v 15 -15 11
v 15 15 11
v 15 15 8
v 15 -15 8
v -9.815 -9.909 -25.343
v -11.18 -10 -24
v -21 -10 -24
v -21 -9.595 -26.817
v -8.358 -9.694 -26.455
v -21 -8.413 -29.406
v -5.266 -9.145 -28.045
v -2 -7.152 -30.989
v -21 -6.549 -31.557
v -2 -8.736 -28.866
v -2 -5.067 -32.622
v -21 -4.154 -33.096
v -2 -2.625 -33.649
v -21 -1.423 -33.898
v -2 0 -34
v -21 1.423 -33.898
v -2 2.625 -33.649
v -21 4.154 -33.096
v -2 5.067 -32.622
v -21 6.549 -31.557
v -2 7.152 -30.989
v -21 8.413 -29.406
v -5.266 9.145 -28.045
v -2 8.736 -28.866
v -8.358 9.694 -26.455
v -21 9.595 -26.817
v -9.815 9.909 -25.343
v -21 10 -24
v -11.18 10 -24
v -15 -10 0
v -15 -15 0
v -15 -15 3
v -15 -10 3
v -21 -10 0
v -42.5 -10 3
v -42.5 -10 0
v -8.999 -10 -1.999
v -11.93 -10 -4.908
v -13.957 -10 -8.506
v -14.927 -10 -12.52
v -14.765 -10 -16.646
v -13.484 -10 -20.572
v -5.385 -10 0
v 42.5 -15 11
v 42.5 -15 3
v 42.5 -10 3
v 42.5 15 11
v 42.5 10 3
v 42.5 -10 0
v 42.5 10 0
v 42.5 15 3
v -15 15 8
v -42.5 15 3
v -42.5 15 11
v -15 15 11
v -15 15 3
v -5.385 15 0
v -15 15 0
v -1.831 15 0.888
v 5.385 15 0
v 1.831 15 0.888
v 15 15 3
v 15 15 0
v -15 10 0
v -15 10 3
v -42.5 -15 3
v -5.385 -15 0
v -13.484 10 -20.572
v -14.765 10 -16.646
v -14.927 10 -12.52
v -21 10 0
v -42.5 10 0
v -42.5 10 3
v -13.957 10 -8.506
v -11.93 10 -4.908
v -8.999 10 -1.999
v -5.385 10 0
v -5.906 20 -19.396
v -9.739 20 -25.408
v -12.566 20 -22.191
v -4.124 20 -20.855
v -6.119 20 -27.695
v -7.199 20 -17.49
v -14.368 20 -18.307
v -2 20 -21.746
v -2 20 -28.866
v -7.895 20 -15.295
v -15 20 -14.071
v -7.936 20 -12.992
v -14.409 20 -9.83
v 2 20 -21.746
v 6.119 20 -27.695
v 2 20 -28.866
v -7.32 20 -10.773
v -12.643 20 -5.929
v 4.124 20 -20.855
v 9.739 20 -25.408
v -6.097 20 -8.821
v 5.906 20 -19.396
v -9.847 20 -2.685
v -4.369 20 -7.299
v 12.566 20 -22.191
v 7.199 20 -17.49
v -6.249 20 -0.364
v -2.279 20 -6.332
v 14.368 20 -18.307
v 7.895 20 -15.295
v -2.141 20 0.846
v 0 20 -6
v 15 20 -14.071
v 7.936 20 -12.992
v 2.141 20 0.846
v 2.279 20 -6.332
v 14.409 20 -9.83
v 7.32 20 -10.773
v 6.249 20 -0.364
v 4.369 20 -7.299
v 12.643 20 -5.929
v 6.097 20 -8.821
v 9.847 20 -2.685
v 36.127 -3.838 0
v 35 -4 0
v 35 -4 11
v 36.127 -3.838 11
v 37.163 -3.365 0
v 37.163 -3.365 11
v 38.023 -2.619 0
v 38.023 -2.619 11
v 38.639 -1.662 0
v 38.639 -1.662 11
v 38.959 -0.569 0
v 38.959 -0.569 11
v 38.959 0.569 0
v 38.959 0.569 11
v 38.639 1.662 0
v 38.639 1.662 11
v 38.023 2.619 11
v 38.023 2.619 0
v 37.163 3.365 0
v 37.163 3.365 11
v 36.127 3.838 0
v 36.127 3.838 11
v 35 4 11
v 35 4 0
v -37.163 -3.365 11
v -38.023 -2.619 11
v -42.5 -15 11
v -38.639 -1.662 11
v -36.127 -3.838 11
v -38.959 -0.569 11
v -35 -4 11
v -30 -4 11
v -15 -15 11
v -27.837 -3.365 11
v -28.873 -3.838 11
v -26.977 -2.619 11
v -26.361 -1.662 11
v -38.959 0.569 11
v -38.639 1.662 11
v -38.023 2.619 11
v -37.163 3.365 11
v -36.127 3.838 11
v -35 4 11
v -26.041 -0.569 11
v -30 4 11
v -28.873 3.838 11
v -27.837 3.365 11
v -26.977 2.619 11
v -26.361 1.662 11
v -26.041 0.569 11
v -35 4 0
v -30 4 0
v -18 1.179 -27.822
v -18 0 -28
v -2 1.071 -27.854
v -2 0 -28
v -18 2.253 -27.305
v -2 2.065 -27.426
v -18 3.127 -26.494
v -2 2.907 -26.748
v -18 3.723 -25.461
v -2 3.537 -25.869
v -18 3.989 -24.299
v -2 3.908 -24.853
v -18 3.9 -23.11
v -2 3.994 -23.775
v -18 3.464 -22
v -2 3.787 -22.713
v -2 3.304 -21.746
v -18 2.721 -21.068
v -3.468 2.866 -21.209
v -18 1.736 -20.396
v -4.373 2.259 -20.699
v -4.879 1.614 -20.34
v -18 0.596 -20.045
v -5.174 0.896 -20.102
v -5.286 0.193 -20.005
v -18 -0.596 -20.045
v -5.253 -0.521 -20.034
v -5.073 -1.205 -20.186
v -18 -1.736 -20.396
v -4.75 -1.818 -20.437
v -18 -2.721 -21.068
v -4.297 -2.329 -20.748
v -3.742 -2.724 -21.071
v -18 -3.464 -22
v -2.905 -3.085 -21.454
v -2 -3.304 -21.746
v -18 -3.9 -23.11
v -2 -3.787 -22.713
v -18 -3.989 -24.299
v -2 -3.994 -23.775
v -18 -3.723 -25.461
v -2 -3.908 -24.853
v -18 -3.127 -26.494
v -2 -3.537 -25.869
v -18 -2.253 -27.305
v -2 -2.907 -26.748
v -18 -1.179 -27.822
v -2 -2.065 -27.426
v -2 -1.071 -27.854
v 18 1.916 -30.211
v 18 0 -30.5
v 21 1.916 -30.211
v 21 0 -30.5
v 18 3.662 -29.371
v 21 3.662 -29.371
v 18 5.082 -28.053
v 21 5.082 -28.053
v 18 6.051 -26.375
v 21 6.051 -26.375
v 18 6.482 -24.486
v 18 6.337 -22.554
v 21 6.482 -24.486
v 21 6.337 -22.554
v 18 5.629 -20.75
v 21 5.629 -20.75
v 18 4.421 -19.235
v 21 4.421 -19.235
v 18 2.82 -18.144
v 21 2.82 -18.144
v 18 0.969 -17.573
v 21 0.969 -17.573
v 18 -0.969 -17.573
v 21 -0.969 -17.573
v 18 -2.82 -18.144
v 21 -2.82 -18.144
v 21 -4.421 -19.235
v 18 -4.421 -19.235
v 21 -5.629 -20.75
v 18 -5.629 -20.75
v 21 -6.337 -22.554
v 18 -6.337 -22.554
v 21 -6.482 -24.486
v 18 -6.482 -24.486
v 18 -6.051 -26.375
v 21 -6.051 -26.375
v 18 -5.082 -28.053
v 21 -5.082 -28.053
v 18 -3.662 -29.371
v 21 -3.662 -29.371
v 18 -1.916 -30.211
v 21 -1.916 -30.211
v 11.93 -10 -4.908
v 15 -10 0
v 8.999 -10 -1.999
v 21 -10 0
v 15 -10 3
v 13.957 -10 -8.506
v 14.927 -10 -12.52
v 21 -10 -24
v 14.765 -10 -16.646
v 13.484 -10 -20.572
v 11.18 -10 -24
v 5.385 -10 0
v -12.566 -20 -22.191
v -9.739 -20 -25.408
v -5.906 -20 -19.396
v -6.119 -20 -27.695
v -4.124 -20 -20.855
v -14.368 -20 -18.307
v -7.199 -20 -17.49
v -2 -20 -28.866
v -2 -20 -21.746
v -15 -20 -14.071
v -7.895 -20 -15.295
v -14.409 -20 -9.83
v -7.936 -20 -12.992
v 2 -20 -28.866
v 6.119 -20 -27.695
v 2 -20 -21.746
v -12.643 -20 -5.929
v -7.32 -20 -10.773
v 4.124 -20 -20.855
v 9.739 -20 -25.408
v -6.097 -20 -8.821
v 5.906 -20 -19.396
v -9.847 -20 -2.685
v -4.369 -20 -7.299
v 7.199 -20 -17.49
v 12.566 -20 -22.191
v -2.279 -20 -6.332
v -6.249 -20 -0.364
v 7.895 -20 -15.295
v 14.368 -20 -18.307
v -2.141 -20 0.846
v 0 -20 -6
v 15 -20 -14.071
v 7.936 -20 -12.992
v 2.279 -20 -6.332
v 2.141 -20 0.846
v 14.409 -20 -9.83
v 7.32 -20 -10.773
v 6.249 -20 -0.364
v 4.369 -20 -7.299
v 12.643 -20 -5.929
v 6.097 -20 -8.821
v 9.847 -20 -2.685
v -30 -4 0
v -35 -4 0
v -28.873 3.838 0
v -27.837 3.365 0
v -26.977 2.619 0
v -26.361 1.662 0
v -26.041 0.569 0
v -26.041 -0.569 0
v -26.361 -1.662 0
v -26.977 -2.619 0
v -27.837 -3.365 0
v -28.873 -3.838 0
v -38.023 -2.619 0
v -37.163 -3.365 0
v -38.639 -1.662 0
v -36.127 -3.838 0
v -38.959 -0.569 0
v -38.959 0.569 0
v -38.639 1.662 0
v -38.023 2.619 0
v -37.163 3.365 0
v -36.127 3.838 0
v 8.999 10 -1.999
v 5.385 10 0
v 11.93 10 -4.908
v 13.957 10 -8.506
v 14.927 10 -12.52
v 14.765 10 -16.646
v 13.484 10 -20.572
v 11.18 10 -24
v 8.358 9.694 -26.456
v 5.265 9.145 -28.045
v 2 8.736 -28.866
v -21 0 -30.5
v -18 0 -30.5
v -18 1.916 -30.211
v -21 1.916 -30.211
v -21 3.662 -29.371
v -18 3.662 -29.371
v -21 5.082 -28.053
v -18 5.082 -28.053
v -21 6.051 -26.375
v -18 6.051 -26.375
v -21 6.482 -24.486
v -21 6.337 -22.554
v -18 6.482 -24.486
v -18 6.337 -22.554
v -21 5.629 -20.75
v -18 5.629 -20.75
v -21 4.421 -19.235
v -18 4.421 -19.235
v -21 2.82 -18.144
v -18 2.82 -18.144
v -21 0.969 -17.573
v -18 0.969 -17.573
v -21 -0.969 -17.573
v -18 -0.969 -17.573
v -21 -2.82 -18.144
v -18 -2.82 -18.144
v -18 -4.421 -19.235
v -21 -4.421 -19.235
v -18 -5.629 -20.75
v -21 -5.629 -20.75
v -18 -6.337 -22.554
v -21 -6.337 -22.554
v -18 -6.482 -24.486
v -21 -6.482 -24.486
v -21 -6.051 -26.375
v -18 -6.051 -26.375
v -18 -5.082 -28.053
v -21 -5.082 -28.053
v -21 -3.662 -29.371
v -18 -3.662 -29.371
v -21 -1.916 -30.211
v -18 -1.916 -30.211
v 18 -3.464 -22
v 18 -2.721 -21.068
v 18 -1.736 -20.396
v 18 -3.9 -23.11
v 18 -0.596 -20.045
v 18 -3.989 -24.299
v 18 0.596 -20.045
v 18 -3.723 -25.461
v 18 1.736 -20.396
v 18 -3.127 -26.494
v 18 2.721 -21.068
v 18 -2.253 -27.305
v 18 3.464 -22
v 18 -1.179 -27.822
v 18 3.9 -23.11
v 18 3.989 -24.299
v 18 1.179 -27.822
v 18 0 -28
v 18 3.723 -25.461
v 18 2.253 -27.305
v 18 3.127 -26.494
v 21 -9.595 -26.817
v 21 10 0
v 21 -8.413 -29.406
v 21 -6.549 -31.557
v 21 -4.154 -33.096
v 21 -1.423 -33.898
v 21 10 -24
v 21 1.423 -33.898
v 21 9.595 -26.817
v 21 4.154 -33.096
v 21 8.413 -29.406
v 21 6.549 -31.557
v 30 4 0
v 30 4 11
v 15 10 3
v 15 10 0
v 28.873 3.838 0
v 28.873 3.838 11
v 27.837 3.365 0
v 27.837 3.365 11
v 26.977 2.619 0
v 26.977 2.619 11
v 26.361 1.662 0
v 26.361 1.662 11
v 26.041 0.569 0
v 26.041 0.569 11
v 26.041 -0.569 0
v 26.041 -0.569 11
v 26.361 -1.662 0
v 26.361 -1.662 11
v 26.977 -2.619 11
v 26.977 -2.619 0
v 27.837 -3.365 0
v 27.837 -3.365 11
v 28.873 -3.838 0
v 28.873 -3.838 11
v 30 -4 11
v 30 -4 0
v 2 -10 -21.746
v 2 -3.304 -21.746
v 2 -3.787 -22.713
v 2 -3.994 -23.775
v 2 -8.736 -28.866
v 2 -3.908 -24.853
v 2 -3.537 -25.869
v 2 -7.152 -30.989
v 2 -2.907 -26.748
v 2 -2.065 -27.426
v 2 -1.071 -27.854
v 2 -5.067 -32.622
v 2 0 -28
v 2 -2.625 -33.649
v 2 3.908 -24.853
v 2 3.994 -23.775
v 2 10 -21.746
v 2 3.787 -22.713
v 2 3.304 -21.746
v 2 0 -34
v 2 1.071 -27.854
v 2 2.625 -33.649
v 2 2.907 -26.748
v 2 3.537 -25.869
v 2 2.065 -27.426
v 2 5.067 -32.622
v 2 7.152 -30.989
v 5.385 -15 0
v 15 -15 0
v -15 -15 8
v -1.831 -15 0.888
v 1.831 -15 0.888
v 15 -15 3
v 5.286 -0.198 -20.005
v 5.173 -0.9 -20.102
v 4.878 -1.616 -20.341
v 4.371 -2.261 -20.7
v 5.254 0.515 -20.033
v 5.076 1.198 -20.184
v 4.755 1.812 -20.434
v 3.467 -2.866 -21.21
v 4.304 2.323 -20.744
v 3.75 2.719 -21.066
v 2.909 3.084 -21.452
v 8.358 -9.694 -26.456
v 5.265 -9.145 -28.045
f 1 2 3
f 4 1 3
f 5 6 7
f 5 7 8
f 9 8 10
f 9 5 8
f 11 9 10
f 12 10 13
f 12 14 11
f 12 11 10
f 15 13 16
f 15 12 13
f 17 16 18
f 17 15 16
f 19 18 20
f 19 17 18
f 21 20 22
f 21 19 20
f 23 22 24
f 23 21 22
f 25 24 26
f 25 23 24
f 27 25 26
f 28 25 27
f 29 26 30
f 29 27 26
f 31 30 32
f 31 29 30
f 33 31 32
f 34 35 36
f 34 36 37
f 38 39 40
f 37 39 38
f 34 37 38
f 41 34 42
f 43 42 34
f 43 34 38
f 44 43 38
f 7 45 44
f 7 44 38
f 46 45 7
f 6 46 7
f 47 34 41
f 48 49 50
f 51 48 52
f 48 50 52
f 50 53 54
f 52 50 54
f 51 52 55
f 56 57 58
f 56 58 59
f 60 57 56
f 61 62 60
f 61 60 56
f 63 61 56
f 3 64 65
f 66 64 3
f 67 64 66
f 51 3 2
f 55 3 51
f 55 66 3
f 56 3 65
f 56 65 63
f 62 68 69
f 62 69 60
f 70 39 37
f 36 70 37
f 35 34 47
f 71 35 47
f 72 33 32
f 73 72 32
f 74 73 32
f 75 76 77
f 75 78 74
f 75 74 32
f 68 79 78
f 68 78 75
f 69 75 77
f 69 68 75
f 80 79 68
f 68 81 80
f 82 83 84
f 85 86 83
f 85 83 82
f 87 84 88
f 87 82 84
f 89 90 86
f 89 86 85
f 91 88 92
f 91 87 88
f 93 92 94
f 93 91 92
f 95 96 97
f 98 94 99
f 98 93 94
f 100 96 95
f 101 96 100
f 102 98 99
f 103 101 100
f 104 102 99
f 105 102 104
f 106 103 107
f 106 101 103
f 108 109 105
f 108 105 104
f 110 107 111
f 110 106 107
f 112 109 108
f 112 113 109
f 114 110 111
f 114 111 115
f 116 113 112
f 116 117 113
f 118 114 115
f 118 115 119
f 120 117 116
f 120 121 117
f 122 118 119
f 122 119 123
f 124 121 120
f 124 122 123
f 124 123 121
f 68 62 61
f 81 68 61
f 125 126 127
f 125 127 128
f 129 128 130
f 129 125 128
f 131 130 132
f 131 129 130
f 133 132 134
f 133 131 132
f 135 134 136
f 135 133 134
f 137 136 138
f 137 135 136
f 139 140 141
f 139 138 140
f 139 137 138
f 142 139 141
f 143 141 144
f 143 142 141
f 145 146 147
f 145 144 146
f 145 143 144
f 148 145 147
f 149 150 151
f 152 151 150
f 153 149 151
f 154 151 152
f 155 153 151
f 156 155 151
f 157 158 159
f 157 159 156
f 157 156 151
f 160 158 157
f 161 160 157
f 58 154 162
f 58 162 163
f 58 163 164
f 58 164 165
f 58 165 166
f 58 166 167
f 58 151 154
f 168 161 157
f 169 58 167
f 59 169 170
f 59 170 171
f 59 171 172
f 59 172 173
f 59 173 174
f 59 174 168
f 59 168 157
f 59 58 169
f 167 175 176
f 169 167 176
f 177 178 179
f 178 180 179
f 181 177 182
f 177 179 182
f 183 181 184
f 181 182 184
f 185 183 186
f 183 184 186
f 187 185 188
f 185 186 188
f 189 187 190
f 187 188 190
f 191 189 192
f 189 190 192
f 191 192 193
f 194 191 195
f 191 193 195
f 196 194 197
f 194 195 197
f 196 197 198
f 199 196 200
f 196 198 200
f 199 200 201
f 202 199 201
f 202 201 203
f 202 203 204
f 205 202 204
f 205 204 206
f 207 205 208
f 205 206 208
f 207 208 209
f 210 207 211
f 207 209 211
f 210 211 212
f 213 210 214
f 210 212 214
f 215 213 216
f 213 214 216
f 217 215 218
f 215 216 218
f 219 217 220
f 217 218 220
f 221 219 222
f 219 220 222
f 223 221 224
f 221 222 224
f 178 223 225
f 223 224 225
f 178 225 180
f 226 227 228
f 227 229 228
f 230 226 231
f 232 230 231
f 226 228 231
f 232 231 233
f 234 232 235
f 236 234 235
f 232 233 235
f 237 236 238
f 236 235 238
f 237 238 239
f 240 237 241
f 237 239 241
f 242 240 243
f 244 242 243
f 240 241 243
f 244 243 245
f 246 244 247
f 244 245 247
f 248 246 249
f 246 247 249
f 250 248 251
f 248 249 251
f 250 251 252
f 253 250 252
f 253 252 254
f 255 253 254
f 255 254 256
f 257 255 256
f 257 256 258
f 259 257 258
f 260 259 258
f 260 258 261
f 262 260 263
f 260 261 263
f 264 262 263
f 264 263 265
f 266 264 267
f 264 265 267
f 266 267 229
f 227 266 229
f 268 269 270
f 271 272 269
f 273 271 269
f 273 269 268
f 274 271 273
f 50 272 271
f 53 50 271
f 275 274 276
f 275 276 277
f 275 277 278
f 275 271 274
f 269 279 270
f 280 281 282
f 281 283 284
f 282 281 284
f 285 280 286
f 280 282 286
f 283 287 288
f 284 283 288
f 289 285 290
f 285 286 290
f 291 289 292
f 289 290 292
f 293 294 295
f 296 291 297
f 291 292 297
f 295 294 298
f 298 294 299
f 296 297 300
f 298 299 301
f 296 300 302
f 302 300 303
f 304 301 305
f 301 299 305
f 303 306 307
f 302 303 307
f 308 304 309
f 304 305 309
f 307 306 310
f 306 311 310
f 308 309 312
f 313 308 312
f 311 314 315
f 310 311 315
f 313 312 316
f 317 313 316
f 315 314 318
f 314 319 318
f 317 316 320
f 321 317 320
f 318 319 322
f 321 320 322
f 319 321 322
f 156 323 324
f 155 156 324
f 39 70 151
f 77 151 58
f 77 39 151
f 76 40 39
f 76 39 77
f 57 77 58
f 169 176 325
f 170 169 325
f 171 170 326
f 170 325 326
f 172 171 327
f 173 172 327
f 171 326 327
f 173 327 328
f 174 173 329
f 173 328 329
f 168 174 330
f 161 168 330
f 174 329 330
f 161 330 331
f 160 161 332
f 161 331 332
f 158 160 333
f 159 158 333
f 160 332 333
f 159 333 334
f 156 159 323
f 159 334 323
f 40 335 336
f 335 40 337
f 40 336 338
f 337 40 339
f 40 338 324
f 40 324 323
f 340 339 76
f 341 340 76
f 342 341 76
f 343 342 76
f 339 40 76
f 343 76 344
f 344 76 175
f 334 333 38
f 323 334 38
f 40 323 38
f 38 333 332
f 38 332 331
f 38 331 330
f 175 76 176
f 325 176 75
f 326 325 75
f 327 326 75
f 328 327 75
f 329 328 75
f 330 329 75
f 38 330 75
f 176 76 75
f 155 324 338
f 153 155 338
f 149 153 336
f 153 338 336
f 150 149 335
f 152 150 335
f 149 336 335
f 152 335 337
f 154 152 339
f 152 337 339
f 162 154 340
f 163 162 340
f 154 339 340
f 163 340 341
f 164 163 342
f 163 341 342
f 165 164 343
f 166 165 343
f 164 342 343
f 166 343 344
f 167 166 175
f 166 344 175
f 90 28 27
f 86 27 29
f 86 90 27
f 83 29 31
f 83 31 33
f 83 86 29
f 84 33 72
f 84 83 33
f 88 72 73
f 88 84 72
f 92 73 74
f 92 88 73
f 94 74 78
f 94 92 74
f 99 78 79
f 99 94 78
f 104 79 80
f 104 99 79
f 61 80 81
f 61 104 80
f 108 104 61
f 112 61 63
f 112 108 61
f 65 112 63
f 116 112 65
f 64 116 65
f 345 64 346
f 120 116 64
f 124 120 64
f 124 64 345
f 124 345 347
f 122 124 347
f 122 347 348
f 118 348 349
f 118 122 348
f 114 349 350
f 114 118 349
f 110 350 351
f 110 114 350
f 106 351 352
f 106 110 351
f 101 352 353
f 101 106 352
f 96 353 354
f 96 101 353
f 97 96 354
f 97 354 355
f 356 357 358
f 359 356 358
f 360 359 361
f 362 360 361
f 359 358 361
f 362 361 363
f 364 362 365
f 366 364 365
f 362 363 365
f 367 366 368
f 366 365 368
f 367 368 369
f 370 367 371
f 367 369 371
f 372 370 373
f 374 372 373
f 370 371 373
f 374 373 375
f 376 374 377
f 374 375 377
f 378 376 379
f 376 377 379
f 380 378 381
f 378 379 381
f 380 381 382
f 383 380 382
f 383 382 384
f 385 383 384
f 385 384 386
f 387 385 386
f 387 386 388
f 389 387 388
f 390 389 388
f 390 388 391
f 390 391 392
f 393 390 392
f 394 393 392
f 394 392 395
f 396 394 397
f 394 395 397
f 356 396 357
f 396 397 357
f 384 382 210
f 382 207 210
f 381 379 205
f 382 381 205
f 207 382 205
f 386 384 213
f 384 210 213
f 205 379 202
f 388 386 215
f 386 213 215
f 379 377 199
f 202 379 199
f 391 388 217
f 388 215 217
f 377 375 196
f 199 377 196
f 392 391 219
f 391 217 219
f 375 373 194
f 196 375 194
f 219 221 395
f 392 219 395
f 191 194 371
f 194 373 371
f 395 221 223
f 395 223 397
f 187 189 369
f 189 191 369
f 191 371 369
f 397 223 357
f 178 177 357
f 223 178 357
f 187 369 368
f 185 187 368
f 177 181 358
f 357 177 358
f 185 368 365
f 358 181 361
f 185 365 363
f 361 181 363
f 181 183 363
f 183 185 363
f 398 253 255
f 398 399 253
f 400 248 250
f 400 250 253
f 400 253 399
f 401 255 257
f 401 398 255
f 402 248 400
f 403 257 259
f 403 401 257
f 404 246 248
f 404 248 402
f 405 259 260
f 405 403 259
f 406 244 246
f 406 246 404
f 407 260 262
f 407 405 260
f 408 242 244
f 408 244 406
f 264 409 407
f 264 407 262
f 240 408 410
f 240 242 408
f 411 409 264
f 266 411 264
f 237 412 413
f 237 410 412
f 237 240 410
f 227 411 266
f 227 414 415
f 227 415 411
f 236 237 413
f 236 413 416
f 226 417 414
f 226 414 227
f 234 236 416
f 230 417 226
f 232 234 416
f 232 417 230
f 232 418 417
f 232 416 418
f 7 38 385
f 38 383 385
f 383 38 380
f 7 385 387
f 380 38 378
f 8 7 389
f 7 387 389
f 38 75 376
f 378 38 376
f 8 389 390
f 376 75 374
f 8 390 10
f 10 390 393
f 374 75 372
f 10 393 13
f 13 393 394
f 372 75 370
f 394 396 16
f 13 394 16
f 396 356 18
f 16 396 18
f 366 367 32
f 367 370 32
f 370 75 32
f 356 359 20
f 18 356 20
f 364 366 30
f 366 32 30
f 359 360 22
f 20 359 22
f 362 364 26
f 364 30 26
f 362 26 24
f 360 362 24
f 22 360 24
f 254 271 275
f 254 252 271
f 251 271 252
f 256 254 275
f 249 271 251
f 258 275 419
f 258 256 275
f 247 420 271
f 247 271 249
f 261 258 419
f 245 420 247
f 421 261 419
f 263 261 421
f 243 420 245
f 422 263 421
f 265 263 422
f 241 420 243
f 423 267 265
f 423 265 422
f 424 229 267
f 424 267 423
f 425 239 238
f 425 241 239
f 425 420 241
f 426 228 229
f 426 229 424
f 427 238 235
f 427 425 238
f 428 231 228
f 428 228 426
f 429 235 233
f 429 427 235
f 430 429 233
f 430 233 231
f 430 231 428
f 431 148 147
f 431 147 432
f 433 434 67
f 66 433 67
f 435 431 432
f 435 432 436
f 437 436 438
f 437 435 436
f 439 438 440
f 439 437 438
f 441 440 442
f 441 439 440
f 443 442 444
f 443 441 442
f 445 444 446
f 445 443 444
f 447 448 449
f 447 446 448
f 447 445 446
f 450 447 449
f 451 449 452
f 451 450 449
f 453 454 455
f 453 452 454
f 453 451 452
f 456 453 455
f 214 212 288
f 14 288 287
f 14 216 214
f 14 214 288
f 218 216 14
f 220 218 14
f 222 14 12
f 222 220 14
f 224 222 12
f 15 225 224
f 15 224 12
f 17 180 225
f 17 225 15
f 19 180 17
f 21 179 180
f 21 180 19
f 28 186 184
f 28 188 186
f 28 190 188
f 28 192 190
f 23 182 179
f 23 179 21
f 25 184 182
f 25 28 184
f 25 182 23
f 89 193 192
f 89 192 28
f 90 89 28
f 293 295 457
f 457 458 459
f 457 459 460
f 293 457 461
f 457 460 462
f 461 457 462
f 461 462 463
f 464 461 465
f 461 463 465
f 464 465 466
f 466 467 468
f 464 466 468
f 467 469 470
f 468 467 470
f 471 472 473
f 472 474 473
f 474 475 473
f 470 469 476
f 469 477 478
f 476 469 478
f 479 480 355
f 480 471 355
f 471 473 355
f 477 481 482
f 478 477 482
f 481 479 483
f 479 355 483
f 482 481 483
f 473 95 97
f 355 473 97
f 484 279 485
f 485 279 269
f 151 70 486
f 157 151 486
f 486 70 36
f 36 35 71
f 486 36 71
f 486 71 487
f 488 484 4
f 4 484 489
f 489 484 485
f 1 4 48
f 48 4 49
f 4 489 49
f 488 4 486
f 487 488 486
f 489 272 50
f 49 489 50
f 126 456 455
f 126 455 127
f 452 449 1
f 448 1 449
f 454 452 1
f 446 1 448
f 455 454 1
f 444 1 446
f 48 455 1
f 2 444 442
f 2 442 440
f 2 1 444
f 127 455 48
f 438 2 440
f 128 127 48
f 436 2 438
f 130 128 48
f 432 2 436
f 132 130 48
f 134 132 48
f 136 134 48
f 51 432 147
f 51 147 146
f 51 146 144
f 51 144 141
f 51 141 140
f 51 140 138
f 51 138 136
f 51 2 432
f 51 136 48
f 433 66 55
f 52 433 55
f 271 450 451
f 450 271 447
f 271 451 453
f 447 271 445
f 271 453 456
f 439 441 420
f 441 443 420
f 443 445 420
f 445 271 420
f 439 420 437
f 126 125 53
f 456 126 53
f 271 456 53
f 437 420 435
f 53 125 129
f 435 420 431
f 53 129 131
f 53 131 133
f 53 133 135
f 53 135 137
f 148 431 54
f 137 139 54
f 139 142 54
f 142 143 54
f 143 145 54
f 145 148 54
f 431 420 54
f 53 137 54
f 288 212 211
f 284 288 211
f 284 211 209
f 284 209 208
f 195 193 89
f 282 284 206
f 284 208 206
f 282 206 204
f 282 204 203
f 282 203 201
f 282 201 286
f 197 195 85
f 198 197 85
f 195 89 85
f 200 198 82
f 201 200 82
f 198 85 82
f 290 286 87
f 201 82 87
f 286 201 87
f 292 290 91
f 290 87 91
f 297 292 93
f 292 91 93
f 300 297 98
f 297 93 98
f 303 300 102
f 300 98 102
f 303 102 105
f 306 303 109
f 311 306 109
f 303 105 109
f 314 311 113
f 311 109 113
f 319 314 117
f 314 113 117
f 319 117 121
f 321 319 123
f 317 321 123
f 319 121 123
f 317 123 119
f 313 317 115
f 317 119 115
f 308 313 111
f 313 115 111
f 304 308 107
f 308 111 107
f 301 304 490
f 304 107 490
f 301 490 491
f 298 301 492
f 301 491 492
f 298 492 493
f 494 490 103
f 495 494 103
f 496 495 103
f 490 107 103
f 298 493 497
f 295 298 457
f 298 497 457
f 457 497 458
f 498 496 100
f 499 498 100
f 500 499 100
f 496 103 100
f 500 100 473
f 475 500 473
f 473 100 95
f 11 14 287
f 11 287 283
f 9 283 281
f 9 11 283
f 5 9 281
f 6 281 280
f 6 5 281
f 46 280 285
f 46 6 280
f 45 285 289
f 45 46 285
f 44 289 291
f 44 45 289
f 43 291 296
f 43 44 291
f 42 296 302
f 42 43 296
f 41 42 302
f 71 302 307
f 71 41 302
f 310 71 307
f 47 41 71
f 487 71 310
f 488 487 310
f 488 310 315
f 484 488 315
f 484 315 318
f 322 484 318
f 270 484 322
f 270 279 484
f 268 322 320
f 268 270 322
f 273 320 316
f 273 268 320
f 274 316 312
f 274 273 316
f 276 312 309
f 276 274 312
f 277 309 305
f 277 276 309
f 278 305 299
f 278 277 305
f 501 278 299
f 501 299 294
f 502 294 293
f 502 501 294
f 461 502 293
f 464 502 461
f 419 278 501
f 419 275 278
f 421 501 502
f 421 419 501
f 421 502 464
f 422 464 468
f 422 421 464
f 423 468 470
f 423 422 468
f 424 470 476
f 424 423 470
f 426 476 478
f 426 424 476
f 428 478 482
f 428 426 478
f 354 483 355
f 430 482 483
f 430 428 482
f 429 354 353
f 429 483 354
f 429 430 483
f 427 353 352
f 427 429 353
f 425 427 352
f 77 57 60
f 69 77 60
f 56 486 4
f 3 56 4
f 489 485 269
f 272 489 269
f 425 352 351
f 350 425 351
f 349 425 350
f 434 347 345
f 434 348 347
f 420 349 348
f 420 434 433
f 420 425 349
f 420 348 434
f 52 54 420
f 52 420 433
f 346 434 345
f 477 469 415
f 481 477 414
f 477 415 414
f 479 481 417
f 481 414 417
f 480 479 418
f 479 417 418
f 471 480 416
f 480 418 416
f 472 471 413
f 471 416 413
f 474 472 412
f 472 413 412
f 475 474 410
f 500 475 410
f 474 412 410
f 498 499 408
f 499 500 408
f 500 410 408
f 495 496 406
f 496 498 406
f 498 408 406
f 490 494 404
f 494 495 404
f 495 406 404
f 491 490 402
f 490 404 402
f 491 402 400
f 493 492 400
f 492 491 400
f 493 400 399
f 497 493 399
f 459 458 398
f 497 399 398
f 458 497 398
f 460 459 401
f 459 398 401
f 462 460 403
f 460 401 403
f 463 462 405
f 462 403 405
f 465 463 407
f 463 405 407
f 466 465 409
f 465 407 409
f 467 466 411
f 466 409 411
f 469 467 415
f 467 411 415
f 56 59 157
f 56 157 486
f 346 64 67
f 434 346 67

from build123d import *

# Parameters (mm, degrees)
SKETCH_1_W                = 85
SKETCH_1_H                = 30
EXTRUDE_1_DEPTH           = 11
SKETCH_2_W                = 27.5
SKETCH_2_H                = 5
CUT_EXTRUDE_3_DEPTH       = 3
CUT_EXTRUDE_5_DEPTH       = 33
EXTRUDE_6_DEPTH           = 20
CUT_EXTRUDE_6_DEPTH       = 20
SKETCH_10_R               = 4
EXTRUDE_7_DEPTH           = 21
SKETCH_11_R               = 6.5
CUT_EXTRUDE_9_DEPTH       = 40.5
SKETCH_13_R               = 6.5
EXTRUDE_8_DEPTH           = 18
SKETCH_14_R               = 4
CUT_EXTRUDE_10_DEPTH      = 18
SKETCH_15_R               = 8
CUT_EXTRUDE_11_DEPTH      = 18
CUT_EXTRUDE_12_DEPTH      = 18
CUT_EXTRUDE_13_DEPTH      = 58.984912
CUT_EXTRUDE_13_DEPTH_BACK = 58.984912
SKETCH_19_W               = 30
SKETCH_19_H               = 3


with BuildPart() as part:
    # 草图1 → 凸台-拉伸1 (new body)
    with BuildSketch(Plane.XY):
        Rectangle(SKETCH_1_W, SKETCH_1_H)
    extrude(amount=EXTRUDE_1_DEPTH)

    # 草图2 → 切除-拉伸3 (cut)
    with BuildSketch(Plane.XY):
        with Locations((-28.75, 12.5)):
            Rectangle(SKETCH_2_W, SKETCH_2_H)
        with Locations((28.75, 12.5)):
            Rectangle(SKETCH_2_W, SKETCH_2_H)
        with Locations((28.75, -12.5)):
            Rectangle(SKETCH_2_W, SKETCH_2_H)
        with Locations((-28.75, -12.5)):
            Rectangle(SKETCH_2_W, SKETCH_2_H)
    extrude(amount=CUT_EXTRUDE_3_DEPTH, mode=Mode.SUBTRACT)

    # 草图6 → 切除-拉伸5 (cut)
    with BuildSketch(Plane.XY):
        with BuildLine():
            Line((-30, 4), (-35, 4))
            ThreePointArc((-35, 4), (-37.828427, 2.828427), (-39, 0))
            ThreePointArc((-39, 0), (-37.828427, -2.828427), (-35, -4))
            Line((-35, -4), (-30, -4))
            ThreePointArc((-30, -4), (-26, 0), (-30, 4))
        make_face()
        with BuildLine():
            ThreePointArc((39, 0), (37.828427, 2.828427), (35, 4))
            Line((35, 4), (30, 4))
            ThreePointArc((30, 4), (26, 0), (30, -4))
            Line((30, -4), (35, -4))
            ThreePointArc((35, -4), (37.828427, -2.828427), (39, 0))
        make_face()
    extrude(amount=CUT_EXTRUDE_5_DEPTH, mode=Mode.SUBTRACT)

    # 草图8 → 凸台-拉伸6 (add, symmetric)
    with BuildSketch(Plane(origin=(0, 0, 0), x_dir=(1, 0, 0), z_dir=(0, 1, 0))):
        with BuildLine():
            ThreePointArc((-5.385165, 0), (-2.738613, -0.747881), (0, -1))
            ThreePointArc((0, -1), (2.738613, -0.747881), (5.385165, 0))
            ThreePointArc((5.385165, 0), (12.364818, 5.508165), (15, 14))
            ThreePointArc((15, 14), (0, 29), (-15, 14))
            ThreePointArc((-15, 14), (-12.364818, 5.508165), (-5.385165, 0))
        make_face()
        with BuildLine():
            ThreePointArc((8, 14), (5.656854, 8.343146), (0, 6))
            ThreePointArc((0, 6), (-5.656854, 19.656854), (8, 14))
        make_face(mode=Mode.SUBTRACT)
    extrude(amount=EXTRUDE_6_DEPTH, both=True)

    # 草图9 → 切除-拉伸6 (cut, symmetric)
    with BuildSketch(Plane(origin=(0, 0, 0), x_dir=(1, 0, 0), z_dir=(0, 1, 0))):
        Polygon((2, 42.203899), (-2, 42.203899), (-2, 20.468656), (0, 20.468656), (2, 20.468656), align=None)
    extrude(amount=CUT_EXTRUDE_6_DEPTH, both=True, mode=Mode.SUBTRACT)

    # 草图10 → 凸台-拉伸7 (add, symmetric)
    with BuildSketch(Plane(origin=(0, 0, 0), x_dir=(0, 0, -1), z_dir=(1, 0, 0))):
        with BuildLine():
            Line((0, 10), (0, -10))
            Line((0, -10), (24, -10))
            ThreePointArc((24, -10), (34, 0), (24, 10))
            Line((24, 10), (0, 10))
        make_face()
        with Locations((24, 0)):
            Circle(SKETCH_10_R, mode=Mode.SUBTRACT)
    extrude(amount=EXTRUDE_7_DEPTH, both=True)

    # 草图11 → 切除-拉伸9 (cut, symmetric)
    with BuildSketch(Plane(origin=(0, 0, 0), x_dir=(0, 0, -1), z_dir=(1, 0, 0))):
        with Locations((24, 0)):
            Circle(SKETCH_11_R)
    extrude(amount=CUT_EXTRUDE_9_DEPTH, both=True, mode=Mode.SUBTRACT)

    # 草图13 → 凸台-拉伸8 (add, symmetric)
    with BuildSketch(Plane(origin=(0, 0, 0), x_dir=(0, 0, -1), z_dir=(1, 0, 0))):
        with Locations((24, 0)):
            Circle(SKETCH_13_R)
    extrude(amount=EXTRUDE_8_DEPTH, both=True)

    # 草图14 → 切除-拉伸10 (cut, symmetric)
    with BuildSketch(Plane(origin=(0, 0, 0), x_dir=(0, 0, -1), z_dir=(1, 0, 0))):
        with Locations((24, 0)):
            Circle(SKETCH_14_R)
    extrude(amount=CUT_EXTRUDE_10_DEPTH, both=True, mode=Mode.SUBTRACT)

    # 草图15 → 切除-拉伸11 (cut, symmetric)
    with BuildSketch(Plane(origin=(0, 0, 0), x_dir=(1, 0, 0), z_dir=(0, 1, 0))):
        with Locations((0, 14)):
            Circle(SKETCH_15_R)
    extrude(amount=CUT_EXTRUDE_11_DEPTH, both=True, mode=Mode.SUBTRACT)

    # 草图16 → 切除-拉伸12 (cut, symmetric)
    with BuildSketch(Plane(origin=(0, 0, 0), x_dir=(1, 0, 0), z_dir=(0, 1, 0))):
        with BuildLine():
            Line((-2, 34), (2, 34))
            Line((2, 34), (2, 21.745967))
            ThreePointArc((2, 21.745967), (0, 22), (-2, 21.745967))
            Line((-2, 21.745967), (-2, 34))
        make_face()
    extrude(amount=CUT_EXTRUDE_12_DEPTH, both=True, mode=Mode.SUBTRACT)

    # 草图19 → 切除-拉伸13 (cut, two sides: drawn at the far end of the back side and taken through both)
    with BuildSketch(Plane(origin=(0, 0, 0), x_dir=(1, 0, 0), z_dir=(0, 1, 0)).offset(-CUT_EXTRUDE_13_DEPTH_BACK)):
        with Locations((0, -9.5)):
            Rectangle(SKETCH_19_W, SKETCH_19_H)
    extrude(amount=CUT_EXTRUDE_13_DEPTH + CUT_EXTRUDE_13_DEPTH_BACK, mode=Mode.SUBTRACT)


solid = part.part
